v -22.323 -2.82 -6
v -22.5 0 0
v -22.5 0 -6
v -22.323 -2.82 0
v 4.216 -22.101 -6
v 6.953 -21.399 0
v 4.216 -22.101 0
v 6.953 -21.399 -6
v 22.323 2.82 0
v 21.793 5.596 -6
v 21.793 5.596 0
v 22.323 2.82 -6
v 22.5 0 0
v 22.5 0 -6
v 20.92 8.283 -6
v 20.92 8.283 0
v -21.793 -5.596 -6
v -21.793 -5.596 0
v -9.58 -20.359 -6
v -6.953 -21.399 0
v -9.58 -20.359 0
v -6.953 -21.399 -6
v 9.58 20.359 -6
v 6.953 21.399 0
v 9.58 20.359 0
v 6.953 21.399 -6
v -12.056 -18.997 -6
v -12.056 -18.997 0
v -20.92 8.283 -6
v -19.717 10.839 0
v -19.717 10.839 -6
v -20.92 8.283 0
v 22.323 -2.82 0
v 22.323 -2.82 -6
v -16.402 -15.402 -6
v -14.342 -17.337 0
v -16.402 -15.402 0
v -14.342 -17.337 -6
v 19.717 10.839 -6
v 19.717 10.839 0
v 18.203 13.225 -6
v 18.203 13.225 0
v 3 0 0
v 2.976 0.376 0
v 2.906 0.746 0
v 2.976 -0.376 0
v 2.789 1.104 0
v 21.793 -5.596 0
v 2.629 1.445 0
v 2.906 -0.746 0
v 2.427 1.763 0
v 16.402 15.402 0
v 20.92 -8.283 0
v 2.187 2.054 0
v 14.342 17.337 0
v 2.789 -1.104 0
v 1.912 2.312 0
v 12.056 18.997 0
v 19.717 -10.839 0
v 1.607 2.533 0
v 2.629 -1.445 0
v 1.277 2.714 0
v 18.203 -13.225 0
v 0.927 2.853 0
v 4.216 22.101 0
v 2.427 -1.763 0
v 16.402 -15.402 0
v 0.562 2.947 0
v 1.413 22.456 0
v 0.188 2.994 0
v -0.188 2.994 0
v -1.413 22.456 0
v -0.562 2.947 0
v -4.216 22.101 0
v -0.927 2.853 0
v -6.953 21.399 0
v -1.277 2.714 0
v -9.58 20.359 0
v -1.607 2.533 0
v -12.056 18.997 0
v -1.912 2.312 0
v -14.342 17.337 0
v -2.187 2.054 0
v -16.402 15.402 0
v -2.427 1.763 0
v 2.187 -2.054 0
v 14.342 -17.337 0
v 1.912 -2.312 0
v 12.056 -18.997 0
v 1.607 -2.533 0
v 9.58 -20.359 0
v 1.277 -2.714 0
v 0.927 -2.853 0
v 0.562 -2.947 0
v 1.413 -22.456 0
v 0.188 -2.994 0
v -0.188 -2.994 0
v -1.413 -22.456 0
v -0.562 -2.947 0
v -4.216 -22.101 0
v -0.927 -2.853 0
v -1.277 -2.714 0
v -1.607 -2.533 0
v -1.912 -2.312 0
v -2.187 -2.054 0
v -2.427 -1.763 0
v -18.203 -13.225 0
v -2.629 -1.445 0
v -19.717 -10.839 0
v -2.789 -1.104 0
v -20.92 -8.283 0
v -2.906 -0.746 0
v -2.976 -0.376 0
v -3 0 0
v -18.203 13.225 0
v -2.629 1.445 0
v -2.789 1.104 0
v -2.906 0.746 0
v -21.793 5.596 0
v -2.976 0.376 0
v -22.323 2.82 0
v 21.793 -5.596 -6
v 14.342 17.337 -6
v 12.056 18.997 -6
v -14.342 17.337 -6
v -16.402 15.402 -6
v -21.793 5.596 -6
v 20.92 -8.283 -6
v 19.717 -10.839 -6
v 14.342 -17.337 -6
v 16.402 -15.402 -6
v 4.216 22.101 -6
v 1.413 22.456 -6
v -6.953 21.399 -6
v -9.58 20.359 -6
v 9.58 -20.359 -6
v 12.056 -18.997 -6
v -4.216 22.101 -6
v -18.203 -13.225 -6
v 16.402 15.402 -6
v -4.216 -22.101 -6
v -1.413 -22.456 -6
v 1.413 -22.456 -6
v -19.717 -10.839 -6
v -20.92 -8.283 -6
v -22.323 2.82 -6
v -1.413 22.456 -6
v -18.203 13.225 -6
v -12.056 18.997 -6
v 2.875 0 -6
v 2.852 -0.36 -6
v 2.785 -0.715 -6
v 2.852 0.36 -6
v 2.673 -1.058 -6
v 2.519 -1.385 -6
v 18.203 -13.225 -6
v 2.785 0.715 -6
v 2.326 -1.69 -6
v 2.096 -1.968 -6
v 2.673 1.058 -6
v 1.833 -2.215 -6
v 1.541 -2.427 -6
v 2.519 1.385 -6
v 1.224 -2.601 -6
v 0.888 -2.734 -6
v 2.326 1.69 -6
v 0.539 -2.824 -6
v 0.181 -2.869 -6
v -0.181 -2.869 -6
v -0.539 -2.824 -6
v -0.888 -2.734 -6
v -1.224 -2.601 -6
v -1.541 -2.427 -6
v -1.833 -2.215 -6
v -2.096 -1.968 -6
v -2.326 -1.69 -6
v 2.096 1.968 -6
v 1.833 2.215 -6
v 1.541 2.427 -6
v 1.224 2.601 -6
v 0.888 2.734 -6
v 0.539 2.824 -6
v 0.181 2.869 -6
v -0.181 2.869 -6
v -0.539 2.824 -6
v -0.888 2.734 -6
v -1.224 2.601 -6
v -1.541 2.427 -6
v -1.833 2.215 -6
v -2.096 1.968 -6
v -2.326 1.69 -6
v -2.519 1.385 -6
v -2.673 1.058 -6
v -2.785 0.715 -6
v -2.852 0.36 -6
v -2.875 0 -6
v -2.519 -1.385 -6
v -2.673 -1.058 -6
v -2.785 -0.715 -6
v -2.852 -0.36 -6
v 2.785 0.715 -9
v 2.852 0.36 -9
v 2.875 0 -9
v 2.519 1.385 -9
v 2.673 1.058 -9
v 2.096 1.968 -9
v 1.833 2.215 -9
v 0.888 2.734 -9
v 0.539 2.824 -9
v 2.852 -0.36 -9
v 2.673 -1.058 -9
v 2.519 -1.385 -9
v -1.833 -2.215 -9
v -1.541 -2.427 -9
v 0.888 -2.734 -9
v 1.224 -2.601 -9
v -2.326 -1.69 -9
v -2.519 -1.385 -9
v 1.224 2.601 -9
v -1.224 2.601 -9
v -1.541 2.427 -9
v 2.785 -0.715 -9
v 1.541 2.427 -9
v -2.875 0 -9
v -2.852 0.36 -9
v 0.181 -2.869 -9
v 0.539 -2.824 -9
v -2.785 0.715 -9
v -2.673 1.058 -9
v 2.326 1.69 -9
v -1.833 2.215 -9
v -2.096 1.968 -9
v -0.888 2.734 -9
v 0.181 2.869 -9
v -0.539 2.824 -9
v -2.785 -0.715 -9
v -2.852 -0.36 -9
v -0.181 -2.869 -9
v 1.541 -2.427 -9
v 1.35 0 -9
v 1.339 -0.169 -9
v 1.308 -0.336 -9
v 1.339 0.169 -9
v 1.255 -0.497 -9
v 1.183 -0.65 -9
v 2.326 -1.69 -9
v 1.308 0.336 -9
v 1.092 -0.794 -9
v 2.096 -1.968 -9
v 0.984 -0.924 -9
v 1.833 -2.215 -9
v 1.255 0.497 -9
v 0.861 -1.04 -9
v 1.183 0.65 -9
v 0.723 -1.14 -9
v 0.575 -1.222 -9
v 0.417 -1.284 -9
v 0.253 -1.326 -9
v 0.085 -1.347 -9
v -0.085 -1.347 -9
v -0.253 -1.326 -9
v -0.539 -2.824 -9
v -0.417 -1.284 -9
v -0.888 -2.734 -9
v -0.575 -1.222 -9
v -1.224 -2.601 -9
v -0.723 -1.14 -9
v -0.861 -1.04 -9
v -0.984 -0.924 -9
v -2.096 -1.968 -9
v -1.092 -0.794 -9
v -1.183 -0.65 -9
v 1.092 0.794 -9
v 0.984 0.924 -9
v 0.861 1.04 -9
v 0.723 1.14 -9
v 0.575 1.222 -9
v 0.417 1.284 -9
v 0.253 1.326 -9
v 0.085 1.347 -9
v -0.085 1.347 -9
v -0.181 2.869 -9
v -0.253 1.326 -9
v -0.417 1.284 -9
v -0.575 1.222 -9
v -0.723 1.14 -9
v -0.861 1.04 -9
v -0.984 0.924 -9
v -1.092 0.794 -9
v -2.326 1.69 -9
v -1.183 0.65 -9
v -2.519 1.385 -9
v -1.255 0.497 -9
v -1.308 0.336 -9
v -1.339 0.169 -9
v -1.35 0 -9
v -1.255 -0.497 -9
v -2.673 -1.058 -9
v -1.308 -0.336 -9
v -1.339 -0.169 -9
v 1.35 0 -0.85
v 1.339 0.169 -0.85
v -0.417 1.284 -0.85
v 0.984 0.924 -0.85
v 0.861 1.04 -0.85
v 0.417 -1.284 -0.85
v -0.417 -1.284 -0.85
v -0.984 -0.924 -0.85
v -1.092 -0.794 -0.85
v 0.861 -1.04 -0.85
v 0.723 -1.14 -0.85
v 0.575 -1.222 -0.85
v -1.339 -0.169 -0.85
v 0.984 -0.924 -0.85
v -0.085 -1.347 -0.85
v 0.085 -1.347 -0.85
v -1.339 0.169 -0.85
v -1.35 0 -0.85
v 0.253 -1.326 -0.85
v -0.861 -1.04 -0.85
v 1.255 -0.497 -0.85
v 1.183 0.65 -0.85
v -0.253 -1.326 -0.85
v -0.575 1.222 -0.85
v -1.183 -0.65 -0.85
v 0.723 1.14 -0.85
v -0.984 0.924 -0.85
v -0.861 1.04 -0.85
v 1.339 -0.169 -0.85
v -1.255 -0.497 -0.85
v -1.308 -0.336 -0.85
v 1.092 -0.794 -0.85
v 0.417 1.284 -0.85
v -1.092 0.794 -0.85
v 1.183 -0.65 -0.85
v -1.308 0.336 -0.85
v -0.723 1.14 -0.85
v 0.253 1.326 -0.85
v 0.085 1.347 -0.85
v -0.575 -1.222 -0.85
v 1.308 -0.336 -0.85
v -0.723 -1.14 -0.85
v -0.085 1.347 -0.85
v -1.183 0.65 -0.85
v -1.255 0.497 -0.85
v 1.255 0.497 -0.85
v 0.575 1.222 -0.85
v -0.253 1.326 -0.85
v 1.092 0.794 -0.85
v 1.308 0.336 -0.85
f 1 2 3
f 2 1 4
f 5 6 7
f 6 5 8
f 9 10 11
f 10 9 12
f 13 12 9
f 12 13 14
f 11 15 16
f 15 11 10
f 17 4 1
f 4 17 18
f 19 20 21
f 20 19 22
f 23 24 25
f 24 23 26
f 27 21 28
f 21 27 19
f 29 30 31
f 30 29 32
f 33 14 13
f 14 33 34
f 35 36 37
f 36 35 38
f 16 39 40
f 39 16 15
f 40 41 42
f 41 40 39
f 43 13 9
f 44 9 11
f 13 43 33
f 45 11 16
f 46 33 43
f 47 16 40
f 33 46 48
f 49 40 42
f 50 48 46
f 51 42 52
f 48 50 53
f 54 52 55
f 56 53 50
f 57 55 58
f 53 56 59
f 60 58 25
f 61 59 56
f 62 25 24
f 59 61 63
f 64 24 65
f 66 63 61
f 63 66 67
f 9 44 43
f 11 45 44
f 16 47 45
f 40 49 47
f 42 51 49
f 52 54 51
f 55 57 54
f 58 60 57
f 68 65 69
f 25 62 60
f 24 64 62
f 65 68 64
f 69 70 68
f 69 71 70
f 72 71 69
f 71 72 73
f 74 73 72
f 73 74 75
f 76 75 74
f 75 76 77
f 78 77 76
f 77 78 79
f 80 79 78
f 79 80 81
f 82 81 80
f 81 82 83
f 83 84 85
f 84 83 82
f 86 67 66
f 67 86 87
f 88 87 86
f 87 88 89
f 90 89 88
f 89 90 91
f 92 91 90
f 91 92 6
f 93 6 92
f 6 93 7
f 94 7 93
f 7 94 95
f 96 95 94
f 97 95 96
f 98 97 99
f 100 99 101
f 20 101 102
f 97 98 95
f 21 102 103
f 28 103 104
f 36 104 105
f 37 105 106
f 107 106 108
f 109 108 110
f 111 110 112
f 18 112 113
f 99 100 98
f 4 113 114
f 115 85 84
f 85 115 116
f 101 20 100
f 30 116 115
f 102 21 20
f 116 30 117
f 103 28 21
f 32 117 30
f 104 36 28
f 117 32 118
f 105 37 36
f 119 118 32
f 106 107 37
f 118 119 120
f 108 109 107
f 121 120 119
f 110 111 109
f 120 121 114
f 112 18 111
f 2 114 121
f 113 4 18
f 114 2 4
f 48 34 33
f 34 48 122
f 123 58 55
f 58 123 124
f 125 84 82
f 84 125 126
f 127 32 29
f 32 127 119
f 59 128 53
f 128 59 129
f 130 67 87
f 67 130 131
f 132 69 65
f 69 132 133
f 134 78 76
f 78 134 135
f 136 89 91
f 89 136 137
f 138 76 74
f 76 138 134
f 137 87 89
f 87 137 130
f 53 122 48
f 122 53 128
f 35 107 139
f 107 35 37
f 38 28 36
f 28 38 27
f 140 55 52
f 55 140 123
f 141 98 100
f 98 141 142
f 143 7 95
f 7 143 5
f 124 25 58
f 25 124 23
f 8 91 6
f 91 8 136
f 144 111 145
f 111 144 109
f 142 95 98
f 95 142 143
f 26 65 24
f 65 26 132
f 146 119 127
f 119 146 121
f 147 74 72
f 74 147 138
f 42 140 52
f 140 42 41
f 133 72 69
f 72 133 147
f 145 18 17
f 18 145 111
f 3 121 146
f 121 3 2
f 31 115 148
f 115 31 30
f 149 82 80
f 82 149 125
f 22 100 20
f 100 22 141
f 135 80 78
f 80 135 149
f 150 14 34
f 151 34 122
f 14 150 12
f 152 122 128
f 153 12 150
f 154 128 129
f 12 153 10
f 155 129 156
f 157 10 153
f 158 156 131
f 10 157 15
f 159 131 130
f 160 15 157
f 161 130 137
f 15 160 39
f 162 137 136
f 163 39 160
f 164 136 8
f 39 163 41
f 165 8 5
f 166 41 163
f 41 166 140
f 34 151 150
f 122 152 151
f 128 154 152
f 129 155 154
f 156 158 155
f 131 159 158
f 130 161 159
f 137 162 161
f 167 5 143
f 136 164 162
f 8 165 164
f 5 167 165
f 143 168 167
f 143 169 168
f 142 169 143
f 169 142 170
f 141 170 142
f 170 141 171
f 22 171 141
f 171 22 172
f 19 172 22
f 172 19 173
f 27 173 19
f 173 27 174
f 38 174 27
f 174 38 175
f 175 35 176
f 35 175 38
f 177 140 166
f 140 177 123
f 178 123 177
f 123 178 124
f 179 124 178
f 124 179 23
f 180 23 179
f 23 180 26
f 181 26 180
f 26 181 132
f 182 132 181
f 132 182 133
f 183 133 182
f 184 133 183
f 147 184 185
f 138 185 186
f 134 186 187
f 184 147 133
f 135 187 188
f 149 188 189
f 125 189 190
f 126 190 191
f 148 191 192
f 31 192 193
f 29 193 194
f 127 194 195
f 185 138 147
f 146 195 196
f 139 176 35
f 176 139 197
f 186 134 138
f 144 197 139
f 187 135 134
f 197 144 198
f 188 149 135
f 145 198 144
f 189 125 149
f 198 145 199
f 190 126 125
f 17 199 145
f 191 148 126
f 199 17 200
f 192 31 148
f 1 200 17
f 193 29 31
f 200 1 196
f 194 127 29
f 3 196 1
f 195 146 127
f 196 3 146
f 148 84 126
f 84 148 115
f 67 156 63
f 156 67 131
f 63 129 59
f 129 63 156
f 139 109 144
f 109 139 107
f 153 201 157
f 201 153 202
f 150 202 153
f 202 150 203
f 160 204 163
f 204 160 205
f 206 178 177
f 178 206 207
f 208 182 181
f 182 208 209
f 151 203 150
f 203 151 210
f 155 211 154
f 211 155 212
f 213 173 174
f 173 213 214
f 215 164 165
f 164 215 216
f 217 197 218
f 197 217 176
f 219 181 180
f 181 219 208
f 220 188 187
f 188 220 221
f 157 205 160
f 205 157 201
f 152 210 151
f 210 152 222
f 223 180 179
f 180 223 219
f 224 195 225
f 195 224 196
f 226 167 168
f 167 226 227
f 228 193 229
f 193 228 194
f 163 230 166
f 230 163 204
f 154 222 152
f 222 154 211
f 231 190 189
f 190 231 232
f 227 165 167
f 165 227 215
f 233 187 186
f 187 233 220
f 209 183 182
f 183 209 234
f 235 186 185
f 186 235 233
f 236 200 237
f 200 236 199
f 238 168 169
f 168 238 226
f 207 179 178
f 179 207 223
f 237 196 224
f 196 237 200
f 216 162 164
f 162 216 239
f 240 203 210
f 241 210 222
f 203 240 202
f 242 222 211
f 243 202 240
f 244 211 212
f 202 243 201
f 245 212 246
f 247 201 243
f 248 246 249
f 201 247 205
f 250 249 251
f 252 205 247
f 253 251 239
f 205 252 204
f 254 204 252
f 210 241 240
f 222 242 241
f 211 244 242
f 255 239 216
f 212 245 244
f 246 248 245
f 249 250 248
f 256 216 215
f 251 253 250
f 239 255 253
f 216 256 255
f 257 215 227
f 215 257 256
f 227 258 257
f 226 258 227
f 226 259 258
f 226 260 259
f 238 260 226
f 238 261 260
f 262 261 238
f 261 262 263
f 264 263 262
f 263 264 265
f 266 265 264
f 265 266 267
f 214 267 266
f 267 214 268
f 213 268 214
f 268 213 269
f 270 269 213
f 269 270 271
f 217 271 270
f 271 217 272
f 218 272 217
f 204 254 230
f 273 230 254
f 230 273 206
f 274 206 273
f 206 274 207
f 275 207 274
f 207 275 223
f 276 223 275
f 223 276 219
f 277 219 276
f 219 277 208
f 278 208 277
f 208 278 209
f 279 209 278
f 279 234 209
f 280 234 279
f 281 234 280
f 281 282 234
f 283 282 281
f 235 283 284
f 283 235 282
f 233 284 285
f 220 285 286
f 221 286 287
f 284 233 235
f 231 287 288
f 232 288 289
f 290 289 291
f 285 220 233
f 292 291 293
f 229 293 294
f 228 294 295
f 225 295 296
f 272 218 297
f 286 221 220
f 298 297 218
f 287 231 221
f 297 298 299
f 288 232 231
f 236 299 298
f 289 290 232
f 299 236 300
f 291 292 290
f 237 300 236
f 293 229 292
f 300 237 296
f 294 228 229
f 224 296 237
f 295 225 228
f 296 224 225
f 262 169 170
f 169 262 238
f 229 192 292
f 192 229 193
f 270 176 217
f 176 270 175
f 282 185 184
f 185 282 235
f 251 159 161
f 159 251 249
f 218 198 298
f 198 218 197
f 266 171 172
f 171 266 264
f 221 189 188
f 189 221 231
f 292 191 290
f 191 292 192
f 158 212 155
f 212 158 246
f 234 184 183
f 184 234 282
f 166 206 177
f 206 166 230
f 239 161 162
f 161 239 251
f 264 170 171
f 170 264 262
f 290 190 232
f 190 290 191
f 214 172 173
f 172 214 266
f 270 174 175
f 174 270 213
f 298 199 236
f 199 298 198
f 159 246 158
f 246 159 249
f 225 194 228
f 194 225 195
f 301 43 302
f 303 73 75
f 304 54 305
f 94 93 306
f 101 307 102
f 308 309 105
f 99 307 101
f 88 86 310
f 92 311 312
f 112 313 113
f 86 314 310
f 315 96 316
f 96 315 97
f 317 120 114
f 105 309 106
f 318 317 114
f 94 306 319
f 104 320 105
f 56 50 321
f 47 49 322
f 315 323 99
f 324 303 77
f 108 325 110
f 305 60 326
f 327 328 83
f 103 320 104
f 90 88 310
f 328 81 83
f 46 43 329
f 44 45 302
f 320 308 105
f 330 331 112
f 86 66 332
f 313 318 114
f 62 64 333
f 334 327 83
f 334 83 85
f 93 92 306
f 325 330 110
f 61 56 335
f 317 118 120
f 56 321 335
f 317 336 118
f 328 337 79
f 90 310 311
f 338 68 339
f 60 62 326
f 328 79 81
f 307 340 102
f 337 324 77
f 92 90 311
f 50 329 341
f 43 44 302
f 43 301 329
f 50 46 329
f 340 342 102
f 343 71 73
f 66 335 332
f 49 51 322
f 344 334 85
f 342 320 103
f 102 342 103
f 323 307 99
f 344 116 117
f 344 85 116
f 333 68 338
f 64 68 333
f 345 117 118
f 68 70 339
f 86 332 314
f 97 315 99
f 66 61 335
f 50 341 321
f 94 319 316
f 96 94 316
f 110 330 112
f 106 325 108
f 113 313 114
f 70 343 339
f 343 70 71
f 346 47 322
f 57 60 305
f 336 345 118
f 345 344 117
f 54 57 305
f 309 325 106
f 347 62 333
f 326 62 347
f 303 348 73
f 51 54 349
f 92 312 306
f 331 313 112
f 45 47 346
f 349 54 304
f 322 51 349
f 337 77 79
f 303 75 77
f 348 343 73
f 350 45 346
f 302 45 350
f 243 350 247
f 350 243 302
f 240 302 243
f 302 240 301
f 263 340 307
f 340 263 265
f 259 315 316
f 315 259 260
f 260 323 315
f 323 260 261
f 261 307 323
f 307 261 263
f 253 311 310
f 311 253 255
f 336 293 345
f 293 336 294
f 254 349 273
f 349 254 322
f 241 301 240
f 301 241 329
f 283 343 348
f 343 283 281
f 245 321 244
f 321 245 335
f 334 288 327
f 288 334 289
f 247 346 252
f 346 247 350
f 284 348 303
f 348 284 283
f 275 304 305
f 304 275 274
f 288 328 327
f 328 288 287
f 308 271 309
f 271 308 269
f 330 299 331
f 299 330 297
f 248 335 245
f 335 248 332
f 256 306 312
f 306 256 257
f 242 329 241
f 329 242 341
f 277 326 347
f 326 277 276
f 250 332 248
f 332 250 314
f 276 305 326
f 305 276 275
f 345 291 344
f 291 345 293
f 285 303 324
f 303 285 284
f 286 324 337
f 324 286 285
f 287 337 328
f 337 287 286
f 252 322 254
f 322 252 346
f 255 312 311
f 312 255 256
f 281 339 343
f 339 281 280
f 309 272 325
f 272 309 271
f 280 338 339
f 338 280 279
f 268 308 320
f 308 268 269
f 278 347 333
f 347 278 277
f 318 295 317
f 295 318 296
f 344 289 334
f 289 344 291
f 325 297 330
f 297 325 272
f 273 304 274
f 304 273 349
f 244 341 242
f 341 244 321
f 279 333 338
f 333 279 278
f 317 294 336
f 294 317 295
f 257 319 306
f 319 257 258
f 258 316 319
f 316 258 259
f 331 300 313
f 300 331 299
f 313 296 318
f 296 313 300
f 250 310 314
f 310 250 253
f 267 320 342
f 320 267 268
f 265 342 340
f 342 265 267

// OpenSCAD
$fn = 50;

difference() {
	union() {
		translate(v = [0, 0, -6.0]) {
			cylinder(h = 6, r = 22.5);
		}
		#translate(v = [0, 0, -9.0]) {
			cylinder(h = 9, r = 2.875);
		}
	}
	union() {
		translate(v = [0, 0, 0]) {
			rotate(a = [0, 0, 0]) {
				difference() {
					union() {
						translate(v = [0, 0, -9.0]) {
							cylinder(h = 9, r = 1.0);
						}
						translate(v = [0, 0, -0.85]) {
							cylinder(h = 0.85, r1 = 1.35, r2 = 3.0);
						}
						translate(v = [0, 0, -9.0]) {
							cylinder(h = 9, r = 1.35);
						}
						translate(v = [0, 0, -9.0]) {
							cylinder(h = 9, r = 1.0);
						}
					}
					union();
				}
			}
		}
	}
}
